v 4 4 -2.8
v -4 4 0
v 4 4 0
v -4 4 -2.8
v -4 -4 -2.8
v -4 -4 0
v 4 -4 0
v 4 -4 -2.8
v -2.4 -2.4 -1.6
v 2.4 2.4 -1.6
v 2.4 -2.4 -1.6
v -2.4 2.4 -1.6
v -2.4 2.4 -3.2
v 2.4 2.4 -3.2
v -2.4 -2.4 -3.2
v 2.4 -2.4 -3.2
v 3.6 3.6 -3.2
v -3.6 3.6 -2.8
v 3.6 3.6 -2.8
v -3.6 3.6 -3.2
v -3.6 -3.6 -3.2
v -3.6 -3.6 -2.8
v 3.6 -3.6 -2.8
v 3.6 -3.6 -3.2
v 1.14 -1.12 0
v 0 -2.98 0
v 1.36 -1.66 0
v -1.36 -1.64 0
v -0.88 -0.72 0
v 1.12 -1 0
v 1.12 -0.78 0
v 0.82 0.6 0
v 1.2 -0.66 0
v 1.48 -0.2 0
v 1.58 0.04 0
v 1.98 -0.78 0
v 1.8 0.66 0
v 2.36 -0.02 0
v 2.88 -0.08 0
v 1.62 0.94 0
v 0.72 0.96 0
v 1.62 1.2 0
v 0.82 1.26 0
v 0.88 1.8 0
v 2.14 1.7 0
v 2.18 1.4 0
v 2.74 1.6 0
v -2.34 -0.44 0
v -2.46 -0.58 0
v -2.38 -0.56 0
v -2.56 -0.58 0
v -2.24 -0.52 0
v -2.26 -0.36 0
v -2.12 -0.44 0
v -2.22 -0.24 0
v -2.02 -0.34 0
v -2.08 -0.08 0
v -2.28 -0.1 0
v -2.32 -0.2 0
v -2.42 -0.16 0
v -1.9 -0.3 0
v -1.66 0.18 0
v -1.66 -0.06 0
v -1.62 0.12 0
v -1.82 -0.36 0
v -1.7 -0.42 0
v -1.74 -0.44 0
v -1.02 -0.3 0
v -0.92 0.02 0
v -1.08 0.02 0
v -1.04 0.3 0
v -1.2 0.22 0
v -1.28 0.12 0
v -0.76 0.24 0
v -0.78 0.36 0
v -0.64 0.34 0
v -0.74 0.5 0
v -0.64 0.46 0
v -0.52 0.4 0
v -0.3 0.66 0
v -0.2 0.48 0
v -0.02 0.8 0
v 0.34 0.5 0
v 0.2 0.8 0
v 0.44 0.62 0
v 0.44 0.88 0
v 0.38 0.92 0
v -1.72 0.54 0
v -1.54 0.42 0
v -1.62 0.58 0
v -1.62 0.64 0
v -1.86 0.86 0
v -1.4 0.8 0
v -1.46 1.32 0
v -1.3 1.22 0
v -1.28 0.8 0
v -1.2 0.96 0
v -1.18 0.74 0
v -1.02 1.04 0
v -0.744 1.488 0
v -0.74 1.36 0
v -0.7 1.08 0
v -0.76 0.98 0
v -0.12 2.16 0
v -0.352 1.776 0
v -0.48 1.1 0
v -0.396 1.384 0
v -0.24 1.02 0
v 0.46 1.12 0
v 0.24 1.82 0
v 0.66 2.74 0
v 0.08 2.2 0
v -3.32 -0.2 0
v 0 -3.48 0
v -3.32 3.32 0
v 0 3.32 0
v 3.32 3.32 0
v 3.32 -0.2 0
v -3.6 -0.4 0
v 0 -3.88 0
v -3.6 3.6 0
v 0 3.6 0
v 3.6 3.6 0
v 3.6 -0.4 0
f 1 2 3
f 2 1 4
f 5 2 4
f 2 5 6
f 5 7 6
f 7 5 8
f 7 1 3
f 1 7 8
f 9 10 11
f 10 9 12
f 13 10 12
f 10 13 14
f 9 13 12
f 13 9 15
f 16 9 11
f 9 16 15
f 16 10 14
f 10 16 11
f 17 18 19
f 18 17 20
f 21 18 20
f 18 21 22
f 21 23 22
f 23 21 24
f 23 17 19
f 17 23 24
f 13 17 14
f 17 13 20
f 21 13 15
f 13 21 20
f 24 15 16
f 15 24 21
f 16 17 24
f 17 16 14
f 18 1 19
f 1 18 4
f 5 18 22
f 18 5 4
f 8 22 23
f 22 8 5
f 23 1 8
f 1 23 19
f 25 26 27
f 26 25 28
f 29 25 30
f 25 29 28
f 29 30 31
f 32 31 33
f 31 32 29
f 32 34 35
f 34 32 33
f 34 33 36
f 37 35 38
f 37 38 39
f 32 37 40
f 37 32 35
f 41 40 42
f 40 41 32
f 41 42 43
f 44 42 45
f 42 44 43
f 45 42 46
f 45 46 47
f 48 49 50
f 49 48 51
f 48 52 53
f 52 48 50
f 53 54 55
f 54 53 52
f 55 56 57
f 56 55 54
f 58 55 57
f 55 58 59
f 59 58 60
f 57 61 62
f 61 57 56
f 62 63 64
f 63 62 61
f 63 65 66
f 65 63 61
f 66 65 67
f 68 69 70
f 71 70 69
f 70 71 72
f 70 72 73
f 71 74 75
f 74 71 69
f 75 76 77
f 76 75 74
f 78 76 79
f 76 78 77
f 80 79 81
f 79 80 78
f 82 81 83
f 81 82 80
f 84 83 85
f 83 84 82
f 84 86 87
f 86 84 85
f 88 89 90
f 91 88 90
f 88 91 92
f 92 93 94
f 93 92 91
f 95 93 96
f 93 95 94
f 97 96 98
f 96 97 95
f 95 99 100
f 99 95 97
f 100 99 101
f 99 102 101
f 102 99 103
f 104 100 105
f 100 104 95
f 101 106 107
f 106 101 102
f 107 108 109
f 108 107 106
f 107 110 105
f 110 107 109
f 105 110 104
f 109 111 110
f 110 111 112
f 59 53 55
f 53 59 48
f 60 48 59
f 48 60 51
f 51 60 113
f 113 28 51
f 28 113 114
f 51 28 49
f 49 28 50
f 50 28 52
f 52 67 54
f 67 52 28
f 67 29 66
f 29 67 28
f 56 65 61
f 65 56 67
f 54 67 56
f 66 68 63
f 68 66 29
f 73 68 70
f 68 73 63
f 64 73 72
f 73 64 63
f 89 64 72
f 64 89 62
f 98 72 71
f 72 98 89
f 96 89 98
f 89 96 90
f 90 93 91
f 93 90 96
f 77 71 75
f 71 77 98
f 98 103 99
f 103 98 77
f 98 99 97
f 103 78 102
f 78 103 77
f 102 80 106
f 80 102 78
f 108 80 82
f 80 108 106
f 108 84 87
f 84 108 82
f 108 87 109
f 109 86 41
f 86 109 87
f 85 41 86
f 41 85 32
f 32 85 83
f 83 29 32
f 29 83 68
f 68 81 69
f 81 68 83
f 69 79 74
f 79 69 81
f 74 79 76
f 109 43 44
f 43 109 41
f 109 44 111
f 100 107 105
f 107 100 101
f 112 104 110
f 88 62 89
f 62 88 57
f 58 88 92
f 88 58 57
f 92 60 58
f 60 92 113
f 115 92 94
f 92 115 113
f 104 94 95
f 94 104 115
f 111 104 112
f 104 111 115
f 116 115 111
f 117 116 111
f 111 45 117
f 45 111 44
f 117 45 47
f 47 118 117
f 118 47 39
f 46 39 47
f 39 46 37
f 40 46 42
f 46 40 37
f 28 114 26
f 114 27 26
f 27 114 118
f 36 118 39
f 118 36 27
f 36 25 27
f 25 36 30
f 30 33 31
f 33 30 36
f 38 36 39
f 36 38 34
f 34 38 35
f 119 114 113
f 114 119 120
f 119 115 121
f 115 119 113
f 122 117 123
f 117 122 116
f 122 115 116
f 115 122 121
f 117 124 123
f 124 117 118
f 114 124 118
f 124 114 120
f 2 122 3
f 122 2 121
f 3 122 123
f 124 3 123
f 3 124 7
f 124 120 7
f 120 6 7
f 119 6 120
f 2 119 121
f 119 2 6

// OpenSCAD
// file: ../p/box5.scad
use <../lib.scad>
function ldraw_lib__box5() = [
// 0 Box with 5 Faces and All Edges
// 0 Name: box5.dat
// 0 Author: James Jessiman
// 0 !LDRAW_ORG Primitive UPDATE 2012-01
// 0 !LICENSE Licensed under CC BY 2.0 and CC BY 4.0 : see CAreadme.txt
// 
// 0 BFC CERTIFY CCW
  [0,"BFC","CERTIFY"],
  [0,"BFC","CCW"],
// 
// 0 !HISTORY 2002-04-03 [sbliss] Modified for BFC compliance
// 0 !HISTORY 2002-04-25 [PTadmin] Official Update 2002-02
// 0 !HISTORY 2007-06-24 [PTadmin] Header formatted for Contributor Agreement
// 0 !HISTORY 2008-07-01 [PTadmin] Official Update 2008-01
// 0 !HISTORY 2012-02-16 [Philo] Changed to CCW
// 0 !HISTORY 2012-03-30 [PTadmin] Official Update 2012-01
// 
// 
// 2 24 1 1 1 -1 1 1
  [2,24,1,1,1,-1,1,1],
// 2 24 -1 1 1 -1 1 -1
  [2,24,-1,1,1,-1,1,-1],
// 2 24 -1 1 -1 1 1 -1
  [2,24,-1,1,-1,1,1,-1],
// 2 24 1 1 -1 1 1 1
  [2,24,1,1,-1,1,1,1],
// 2 24 1 0 1 -1 0 1
  [2,24,1,0,1,-1,0,1],
// 2 24 -1 0 1 -1 0 -1
  [2,24,-1,0,1,-1,0,-1],
// 2 24 -1 0 -1 1 0 -1
  [2,24,-1,0,-1,1,0,-1],
// 2 24 1 0 -1 1 0 1
  [2,24,1,0,-1,1,0,1],
// 2 24 1 0 1 1 1 1
  [2,24,1,0,1,1,1,1],
// 2 24 -1 0 1 -1 1 1
  [2,24,-1,0,1,-1,1,1],
// 2 24 1 0 -1 1 1 -1
  [2,24,1,0,-1,1,1,-1],
// 2 24 -1 0 -1 -1 1 -1
  [2,24,-1,0,-1,-1,1,-1],
// 4 16 -1 1 1 1 1 1 1 1 -1 -1 1 -1
  [4,16,-1,1,1,1,1,1,1,1,-1,-1,1,-1],
// 4 16 -1 1 1 -1 0 1 1 0 1 1 1 1
  [4,16,-1,1,1,-1,0,1,1,0,1,1,1,1],
// 4 16 -1 1 -1 -1 0 -1 -1 0 1 -1 1 1
  [4,16,-1,1,-1,-1,0,-1,-1,0,1,-1,1,1],
// 4 16 1 1 -1 1 0 -1 -1 0 -1 -1 1 -1
  [4,16,1,1,-1,1,0,-1,-1,0,-1,-1,1,-1],
// 4 16 1 1 1 1 0 1 1 0 -1 1 1 -1
  [4,16,1,1,1,1,0,1,1,0,-1,1,1,-1],
];
module ldraw_lib__box5(step=0, col=false, unit=2/5, alt=false, line=0.2, solid=!$preview)
    makepoly(ldraw_lib__box5(), step=step, col=col, unit=unit, alt=alt, line=line, solid=solid);
ldraw_lib__box5(line=0.2);
// file: ../p/box4.scad
use <../lib.scad>
function ldraw_lib__box4() = [
// 0 Box with 4 Faces (2 Parallel Pairs) and All Edges
// 0 Name: box4.dat
// 0 Author: James Jessiman
// 0 !LDRAW_ORG Primitive UPDATE 2012-01
// 0 !LICENSE Licensed under CC BY 2.0 and CC BY 4.0 : see CAreadme.txt
// 
// 0 BFC CERTIFY CCW
  [0,"BFC","CERTIFY"],
  [0,"BFC","CCW"],
// 
// 0 !HISTORY 2002-04-03 [sbliss] Modified for BFC compliance
// 0 !HISTORY 2002-04-25 [PTadmin] Official Update 2002-02
// 0 !HISTORY 2007-06-24 [PTadmin] Header formatted for Contributor Agreement
// 0 !HISTORY 2008-07-01 [PTadmin] Official Update 2008-01
// 0 !HISTORY 2012-02-16 [Philo] Changed to CCW
// 0 !HISTORY 2012-03-30 [PTadmin] Official Update 2012-01
// 
// 
// 2 24 1 1 1 -1 1 1
  [2,24,1,1,1,-1,1,1],
// 2 24 -1 1 1 -1 1 -1
  [2,24,-1,1,1,-1,1,-1],
// 2 24 -1 1 -1 1 1 -1
  [2,24,-1,1,-1,1,1,-1],
// 2 24 1 1 -1 1 1 1
  [2,24,1,1,-1,1,1,1],
// 2 24 1 0 1 -1 0 1
  [2,24,1,0,1,-1,0,1],
// 2 24 -1 0 1 -1 0 -1
  [2,24,-1,0,1,-1,0,-1],
// 2 24 -1 0 -1 1 0 -1
  [2,24,-1,0,-1,1,0,-1],
// 2 24 1 0 -1 1 0 1
  [2,24,1,0,-1,1,0,1],
// 2 24 1 0 1 1 1 1
  [2,24,1,0,1,1,1,1],
// 2 24 -1 0 1 -1 1 1
  [2,24,-1,0,1,-1,1,1],
// 2 24 1 0 -1 1 1 -1
  [2,24,1,0,-1,1,1,-1],
// 2 24 -1 0 -1 -1 1 -1
  [2,24,-1,0,-1,-1,1,-1],
// 4 16 -1 1 1 -1 0 1 1 0 1 1 1 1
  [4,16,-1,1,1,-1,0,1,1,0,1,1,1,1],
// 4 16 -1 1 -1 -1 0 -1 -1 0 1 -1 1 1
  [4,16,-1,1,-1,-1,0,-1,-1,0,1,-1,1,1],
// 4 16 1 1 -1 1 0 -1 -1 0 -1 -1 1 -1
  [4,16,1,1,-1,1,0,-1,-1,0,-1,-1,1,-1],
// 4 16 1 1 1 1 0 1 1 0 -1 1 1 -1
  [4,16,1,1,1,1,0,1,1,0,-1,1,1,-1],
];
module ldraw_lib__box4(step=0, col=false, unit=2/5, alt=false, line=0.2, solid=!$preview)
    makepoly(ldraw_lib__box4(), step=step, col=col, unit=unit, alt=alt, line=line, solid=solid);
ldraw_lib__box4(line=0.2);
// file: s/3070bs01.scad
use <../../lib.scad>
use <../../p/box4.scad>
use <../../p/box5.scad>
function ldraw_lib__s__3070bs01() = [
// 0 ~Tile  1 x  1 with Groove without Top Face
// 0 Name: s\3070bs01.dat
// 0 Author: Chris Dee [cwdee]
// 0 !LDRAW_ORG Subpart UPDATE 2009-02
// 0 !LICENSE Licensed under CC BY 2.0 and CC BY 4.0 : see CAreadme.txt
// 
// 0 BFC CERTIFY CCW
  [0,"BFC","CERTIFY"],
  [0,"BFC","CCW"],
// 
// 0 !HISTORY 2009-09-03 [PTadmin] Official Update 2009-02
// 
// 
// 1 16 0 0 0 10 0 0 0 7 0 0 0 10 box4.dat
  [1,16,0,0,0,10,0,0,0,7,0,0,0,10, ldraw_lib__box4()],
// 0 BFC INVERTNEXT
  [0,"BFC","INVERTNEXT"],
// 1 16 0 8 0 6 0 0 0 -4 0 0 0 6 box5.dat
  [1,16,0,8,0,6,0,0,0,-4,0,0,0,6, ldraw_lib__box5()],
// 1 16 0 7 0 9 0 0 0 1 0 0 0 9 box4.dat
  [1,16,0,7,0,9,0,0,0,1,0,0,0,9, ldraw_lib__box4()],
// 
// 4 16 9 8 9 6 8 6 -6 8 6 -9 8 9
  [4,16,9,8,9,6,8,6,-6,8,6,-9,8,9],
// 4 16 -9 8 9 -6 8 6 -6 8 -6 -9 8 -9
  [4,16,-9,8,9,-6,8,6,-6,8,-6,-9,8,-9],
// 4 16 -9 8 -9 -6 8 -6 6 8 -6 9 8 -9
  [4,16,-9,8,-9,-6,8,-6,6,8,-6,9,8,-9],
// 4 16 9 8 -9 6 8 -6 6 8 6 9 8 9
  [4,16,9,8,-9,6,8,-6,6,8,6,9,8,9],
// 
// 4 16 10 7 10 9 7 9 -9 7 9 -10 7 10
  [4,16,10,7,10,9,7,9,-9,7,9,-10,7,10],
// 4 16 -10 7 10 -9 7 9 -9 7 -9 -10 7 -10
  [4,16,-10,7,10,-9,7,9,-9,7,-9,-10,7,-10],
// 4 16 -10 7 -10 -9 7 -9 9 7 -9 10 7 -10
  [4,16,-10,7,-10,-9,7,-9,9,7,-9,10,7,-10],
// 4 16 10 7 -10 9 7 -9 9 7 9 10 7 10
  [4,16,10,7,-10,9,7,-9,9,7,9,10,7,10],
// 0
];
module ldraw_lib__s__3070bs01(step=0, col=false, unit=2/5, alt=false, line=0.2, solid=!$preview)
    makepoly(ldraw_lib__s__3070bs01(), step=step, col=col, unit=unit, alt=alt, line=line, solid=solid);
ldraw_lib__s__3070bs01(line=0.2);
// file: s/3070bpe0s02.scad
use <../../lib.scad>
function ldraw_lib__s__3070bpe0s02() = [
// 0 ~Pentagonal Shield Frame
// 0 Name: s\3070bpe0s02.dat
// 0 Author: Johann Eisner [technicbasics]
// 0 !LDRAW_ORG Subpart UPDATE 2019-03
// 0 !LICENSE Licensed under CC BY 2.0 and CC BY 4.0 : see CAreadme.txt
// 
// 0 BFC CERTIFY CCW
  [0,"BFC","CERTIFY"],
  [0,"BFC","CCW"],
// 
// 0 !HISTORY 2019-12-27 [PTadmin] Official Update 2019-03
// 
// 
// 4 0 -9 0 -1 0 0 -9.7 0 0 -8.7 -8.3 0 -0.5
  [4,0,-9,0,-1,0,0,-9.7,0,0,-8.7,-8.3,0,-0.5],
// 4 0 -9 0 9 -9 0 -1 -8.3 0 -.5 -8.3 0 8.3
  [4,0,-9,0,9,-9,0,-1,-8.3,0,-.5,-8.3,0,8.3],
// 4 0 9 0 9 0 0 9 0 0 8.3 8.3 0 8.3
  [4,0,9,0,9,0,0,9,0,0,8.3,8.3,0,8.3],
// 4 0 0 0 9 -9 0 9 -8.3 0 8.3 0 0 8.3
  [4,0,0,0,9,-9,0,9,-8.3,0,8.3,0,0,8.3],
// 4 0 9 0 9 8.3 0 8.3 8.3 0 -.5 9 0 -1
  [4,0,9,0,9,8.3,0,8.3,8.3,0,-.5,9,0,-1],
// 4 0 9 0 -1 8.3 0 -0.5 0 0 -8.7 0 0 -9.7
  [4,0,9,0,-1,8.3,0,-0.5,0,0,-8.7,0,0,-9.7],
// 4 16 -10 0 10 -9 0 9 0 0 9 10 0 10
  [4,16,-10,0,10,-9,0,9,0,0,9,10,0,10],
// 3 16 10 0 10 0 0 9 9 0 9
  [3,16,10,0,10,0,0,9,9,0,9],
// 4 16 10 0 10 9 0 9 9 0 -1 10 0 -10
  [4,16,10,0,10,9,0,9,9,0,-1,10,0,-10],
// 3 16 9 0 -1 0 0 -9.7 10 0 -10
  [3,16,9,0,-1,0,0,-9.7,10,0,-10],
// 3 16 0 0 -9.7 -10 0 -10 10 0 -10
  [3,16,0,0,-9.7,-10,0,-10,10,0,-10],
// 3 16 -9 0 -1 -10 0 -10 0 0 -9.7
  [3,16,-9,0,-1,-10,0,-10,0,0,-9.7],
// 4 16 -10 0 10 -10 0 -10 -9 0 -1 -9 0 9
  [4,16,-10,0,10,-10,0,-10,-9,0,-1,-9,0,9],
];
module ldraw_lib__s__3070bpe0s02(step=0, col=false, unit=2/5, alt=false, line=0.2, solid=!$preview)
    makepoly(ldraw_lib__s__3070bpe0s02(), step=step, col=col, unit=unit, alt=alt, line=line, solid=solid);
ldraw_lib__s__3070bpe0s02(line=0.2);
// main file
use <../lib.scad>
use <s/3070bpe0s02.scad>
use <s/3070bpe2s01.scad>
use <s/3070bs01.scad>
function ldraw_lib__3070bpe2() = [
// 0 Tile  1 x  1 with Red Dragon Head on Metallic Silver Pentagonal Shield Pattern
// 0 Name: 3070bpe2.dat
// 0 Author: Vincent Messenet [Cheenzo]
// 0 !LDRAW_ORG Part UPDATE 2019-03
// 0 !LICENSE Licensed under CC BY 2.0 and CC BY 4.0 : see CAreadme.txt
// 
// 0 BFC CERTIFY CCW
  [0,"BFC","CERTIFY"],
  [0,"BFC","CCW"],
// 
// 0 !KEYWORDS BrickLink 3070bpb105, Nexo Knights
// 
// 0 !HISTORY 2019-12-27 [PTadmin] Official Update 2019-03
// 
// 
// 1 16 0 0 0 1 0 0 0 1 0 0 0 1 s\3070bs01.dat
  [1,16,0,0,0,1,0,0,0,1,0,0,0,1, ldraw_lib__s__3070bs01()],
// 1 16 0 0 0 1 0 0 0 1 0 0 0 1 s\3070bpe2s01.dat
  [1,16,0,0,0,1,0,0,0,1,0,0,0,1, ldraw_lib__s__3070bpe2s01()],
// 1 16 0 0 0 1 0 0 0 1 0 0 0 1 s\3070bpe0s02.dat
  [1,16,0,0,0,1,0,0,0,1,0,0,0,1, ldraw_lib__s__3070bpe0s02()],
];
module ldraw_lib__3070bpe2(step=0, col=false, unit=2/5, alt=false, line=0.2, solid=!$preview)
    makepoly(ldraw_lib__3070bpe2(), step=step, col=col, unit=unit, alt=alt, line=line, solid=solid);
ldraw_lib__3070bpe2(line=0.2);
